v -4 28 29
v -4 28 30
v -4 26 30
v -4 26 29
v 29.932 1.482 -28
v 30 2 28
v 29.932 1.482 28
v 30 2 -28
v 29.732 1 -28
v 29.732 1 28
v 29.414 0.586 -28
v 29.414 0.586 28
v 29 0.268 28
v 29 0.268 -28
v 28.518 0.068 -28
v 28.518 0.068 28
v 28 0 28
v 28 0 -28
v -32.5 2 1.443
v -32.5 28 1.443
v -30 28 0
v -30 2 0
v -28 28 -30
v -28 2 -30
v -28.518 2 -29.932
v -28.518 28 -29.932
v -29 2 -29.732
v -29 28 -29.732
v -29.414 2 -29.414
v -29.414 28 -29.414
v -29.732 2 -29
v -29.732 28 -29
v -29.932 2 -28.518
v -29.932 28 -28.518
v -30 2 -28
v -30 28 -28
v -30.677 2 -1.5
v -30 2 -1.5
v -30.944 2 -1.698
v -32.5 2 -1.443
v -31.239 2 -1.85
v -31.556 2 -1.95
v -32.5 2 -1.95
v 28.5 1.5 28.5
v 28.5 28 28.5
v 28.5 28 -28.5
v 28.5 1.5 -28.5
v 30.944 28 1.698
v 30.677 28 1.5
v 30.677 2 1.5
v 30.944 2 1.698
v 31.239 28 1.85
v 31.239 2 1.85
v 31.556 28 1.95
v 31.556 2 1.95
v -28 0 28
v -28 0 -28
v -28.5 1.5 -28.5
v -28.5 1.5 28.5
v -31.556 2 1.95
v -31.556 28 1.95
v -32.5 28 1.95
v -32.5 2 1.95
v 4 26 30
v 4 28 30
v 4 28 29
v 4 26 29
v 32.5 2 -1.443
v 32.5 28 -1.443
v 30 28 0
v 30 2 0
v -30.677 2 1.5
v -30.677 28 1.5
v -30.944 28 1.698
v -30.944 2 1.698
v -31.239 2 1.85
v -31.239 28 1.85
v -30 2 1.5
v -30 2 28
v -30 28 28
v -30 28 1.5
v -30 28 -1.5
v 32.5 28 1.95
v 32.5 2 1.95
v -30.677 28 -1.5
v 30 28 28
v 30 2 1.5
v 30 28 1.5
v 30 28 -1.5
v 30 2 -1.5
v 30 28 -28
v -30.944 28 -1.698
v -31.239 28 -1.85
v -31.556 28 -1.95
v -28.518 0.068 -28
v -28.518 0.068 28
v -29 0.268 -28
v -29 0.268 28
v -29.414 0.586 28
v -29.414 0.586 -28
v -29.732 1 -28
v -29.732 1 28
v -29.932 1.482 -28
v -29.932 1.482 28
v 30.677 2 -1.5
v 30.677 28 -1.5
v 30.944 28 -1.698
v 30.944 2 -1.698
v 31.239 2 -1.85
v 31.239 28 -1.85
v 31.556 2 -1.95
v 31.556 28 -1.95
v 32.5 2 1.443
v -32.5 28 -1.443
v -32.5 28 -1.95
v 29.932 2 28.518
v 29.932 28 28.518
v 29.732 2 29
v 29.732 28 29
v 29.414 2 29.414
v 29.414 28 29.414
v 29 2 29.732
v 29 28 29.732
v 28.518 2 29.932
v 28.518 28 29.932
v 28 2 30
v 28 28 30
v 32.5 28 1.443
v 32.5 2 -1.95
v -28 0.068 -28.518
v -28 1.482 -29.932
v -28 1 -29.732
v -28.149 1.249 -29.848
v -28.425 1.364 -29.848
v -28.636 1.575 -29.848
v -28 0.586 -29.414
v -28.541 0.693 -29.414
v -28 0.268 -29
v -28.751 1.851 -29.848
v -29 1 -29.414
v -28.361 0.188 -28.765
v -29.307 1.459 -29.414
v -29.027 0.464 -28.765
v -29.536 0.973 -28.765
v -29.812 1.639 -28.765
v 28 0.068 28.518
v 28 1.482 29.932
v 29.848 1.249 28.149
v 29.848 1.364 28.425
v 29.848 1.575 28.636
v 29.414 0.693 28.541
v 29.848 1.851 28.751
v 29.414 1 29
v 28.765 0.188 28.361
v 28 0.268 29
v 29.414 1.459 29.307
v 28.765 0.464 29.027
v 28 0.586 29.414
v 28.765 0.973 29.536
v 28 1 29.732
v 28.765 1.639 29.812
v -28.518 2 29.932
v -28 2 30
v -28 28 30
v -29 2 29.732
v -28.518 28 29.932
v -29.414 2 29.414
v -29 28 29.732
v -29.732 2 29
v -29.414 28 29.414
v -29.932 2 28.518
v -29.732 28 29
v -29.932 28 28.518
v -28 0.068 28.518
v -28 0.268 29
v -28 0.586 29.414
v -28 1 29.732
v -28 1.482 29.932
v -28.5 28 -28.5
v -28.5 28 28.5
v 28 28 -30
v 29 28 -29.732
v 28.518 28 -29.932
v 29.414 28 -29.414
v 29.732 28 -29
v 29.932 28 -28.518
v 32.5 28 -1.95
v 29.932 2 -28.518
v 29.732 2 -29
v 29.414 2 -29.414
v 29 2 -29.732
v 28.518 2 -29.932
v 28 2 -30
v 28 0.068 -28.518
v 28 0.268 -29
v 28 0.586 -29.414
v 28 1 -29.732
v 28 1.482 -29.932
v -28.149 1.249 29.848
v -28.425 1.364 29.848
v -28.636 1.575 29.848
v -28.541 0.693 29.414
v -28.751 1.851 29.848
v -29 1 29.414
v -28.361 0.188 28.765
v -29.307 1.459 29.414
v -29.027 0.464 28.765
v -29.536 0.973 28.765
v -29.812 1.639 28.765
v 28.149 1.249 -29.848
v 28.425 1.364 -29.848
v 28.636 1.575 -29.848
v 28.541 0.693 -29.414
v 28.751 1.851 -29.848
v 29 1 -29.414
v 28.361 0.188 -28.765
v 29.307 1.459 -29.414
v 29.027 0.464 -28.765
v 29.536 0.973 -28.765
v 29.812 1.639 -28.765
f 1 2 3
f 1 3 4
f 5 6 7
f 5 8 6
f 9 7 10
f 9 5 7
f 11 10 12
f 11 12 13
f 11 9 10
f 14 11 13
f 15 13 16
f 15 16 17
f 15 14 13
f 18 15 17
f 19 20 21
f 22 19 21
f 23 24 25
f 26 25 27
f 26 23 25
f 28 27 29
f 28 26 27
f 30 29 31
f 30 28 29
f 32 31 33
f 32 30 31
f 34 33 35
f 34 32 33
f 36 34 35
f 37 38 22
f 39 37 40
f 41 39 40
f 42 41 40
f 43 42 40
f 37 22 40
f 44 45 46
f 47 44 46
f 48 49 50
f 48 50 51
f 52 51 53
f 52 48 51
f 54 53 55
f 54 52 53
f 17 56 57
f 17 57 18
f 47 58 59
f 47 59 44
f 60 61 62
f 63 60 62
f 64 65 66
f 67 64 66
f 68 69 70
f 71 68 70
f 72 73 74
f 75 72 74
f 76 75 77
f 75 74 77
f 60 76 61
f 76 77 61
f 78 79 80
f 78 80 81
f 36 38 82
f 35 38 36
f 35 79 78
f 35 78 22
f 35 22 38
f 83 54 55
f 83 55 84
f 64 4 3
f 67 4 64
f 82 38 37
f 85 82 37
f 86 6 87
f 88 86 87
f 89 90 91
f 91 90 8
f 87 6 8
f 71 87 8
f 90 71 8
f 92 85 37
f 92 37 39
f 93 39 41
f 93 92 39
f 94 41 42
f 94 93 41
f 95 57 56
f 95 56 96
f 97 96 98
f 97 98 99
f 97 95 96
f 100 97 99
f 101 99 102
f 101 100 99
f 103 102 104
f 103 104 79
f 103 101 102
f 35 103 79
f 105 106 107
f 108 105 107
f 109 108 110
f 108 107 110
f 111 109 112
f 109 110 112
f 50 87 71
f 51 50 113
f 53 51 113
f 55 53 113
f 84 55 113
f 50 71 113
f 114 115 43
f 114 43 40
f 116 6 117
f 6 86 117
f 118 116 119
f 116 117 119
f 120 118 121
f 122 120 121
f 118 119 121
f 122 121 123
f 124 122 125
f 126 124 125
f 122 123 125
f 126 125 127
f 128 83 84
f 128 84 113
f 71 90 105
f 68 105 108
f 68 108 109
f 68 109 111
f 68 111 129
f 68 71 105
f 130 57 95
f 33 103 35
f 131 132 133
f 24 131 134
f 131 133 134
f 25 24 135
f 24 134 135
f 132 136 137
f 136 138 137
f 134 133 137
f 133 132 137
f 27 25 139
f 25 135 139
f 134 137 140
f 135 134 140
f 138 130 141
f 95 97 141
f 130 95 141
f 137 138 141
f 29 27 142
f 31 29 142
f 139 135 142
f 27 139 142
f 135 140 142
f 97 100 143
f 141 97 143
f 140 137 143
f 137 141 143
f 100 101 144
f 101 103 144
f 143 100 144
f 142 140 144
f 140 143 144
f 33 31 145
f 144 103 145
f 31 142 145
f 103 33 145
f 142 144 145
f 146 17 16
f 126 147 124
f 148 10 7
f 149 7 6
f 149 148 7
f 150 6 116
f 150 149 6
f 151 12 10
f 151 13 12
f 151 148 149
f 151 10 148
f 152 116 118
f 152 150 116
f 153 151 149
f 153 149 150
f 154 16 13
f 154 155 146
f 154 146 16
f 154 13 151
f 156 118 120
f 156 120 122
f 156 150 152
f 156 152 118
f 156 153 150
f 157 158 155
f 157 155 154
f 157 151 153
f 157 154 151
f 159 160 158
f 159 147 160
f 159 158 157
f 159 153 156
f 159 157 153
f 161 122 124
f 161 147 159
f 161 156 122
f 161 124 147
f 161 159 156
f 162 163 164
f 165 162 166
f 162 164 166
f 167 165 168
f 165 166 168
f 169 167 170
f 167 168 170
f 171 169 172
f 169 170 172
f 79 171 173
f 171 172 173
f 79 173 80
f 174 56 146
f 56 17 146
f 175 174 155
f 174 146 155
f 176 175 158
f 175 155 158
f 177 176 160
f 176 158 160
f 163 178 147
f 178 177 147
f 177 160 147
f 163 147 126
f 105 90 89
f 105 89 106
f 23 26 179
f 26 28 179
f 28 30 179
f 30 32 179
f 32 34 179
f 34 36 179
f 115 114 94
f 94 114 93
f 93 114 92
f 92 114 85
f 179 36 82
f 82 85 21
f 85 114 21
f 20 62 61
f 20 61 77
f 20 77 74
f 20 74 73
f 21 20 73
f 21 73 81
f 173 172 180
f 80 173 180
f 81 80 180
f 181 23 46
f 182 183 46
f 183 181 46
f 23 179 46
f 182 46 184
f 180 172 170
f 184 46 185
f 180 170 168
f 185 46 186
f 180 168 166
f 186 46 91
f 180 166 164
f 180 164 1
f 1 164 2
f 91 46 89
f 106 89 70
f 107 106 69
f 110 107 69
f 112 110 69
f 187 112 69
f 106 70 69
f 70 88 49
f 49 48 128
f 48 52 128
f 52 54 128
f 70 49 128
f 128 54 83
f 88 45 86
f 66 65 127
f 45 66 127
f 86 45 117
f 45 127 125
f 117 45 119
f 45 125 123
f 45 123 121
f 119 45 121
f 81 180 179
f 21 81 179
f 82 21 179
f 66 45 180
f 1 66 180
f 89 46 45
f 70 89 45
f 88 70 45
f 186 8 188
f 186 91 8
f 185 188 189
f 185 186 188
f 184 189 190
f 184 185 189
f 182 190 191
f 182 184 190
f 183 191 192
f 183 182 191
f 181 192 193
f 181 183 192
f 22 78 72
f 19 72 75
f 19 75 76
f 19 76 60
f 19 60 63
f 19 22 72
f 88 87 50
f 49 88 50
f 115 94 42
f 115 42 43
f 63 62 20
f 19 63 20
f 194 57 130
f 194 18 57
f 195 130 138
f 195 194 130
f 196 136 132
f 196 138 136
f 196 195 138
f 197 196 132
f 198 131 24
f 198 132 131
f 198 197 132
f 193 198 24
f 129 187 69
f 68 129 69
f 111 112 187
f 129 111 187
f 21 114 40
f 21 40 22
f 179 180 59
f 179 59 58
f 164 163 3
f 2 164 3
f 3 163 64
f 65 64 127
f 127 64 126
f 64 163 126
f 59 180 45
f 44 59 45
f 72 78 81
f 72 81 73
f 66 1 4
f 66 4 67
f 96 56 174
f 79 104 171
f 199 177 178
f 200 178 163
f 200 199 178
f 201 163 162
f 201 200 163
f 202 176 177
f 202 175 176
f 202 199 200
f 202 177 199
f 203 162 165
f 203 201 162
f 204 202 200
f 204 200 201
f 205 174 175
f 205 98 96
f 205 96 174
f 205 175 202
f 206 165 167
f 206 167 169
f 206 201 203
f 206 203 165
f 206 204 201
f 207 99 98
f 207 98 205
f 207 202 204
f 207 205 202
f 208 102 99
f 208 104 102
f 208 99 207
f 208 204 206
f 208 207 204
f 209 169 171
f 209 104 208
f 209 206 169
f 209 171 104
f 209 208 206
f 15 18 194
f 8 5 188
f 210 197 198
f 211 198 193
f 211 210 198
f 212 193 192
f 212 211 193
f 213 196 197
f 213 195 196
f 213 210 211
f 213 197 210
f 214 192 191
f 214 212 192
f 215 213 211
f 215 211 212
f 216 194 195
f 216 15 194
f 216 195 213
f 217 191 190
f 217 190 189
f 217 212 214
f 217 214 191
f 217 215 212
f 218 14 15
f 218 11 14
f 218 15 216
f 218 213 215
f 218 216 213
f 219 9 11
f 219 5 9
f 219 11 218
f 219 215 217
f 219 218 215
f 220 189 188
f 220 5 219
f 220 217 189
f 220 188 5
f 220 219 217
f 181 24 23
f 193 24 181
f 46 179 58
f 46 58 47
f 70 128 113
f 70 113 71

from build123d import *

# Parameters (mm, degrees)
SKETCH_1_W            = 60
SKETCH_1_H            = 60
EXTRUDE_1_DEPTH       = 28
SKETCH_2_W            = 57
SKETCH_2_H            = 57
CUT_EXTRUDE_1_DEPTH   = 26.5
EXTRUDE_3_DEPTH       = 26
MIRROR_5_COPY_1_DEPTH = 26
SKETCH_4_W            = 8
SKETCH_4_H            = 2
CUT_EXTRUDE_2_DEPTH   = 2
FILLET_1_R            = 2


with BuildPart() as part:
    # 草图1 → 凸台-拉伸1 (new body)
    with BuildSketch(Plane(origin=(0, 0, 0), x_dir=(1, 0, 0), z_dir=(0, 1, 0))):
        Rectangle(SKETCH_1_W, SKETCH_1_H)
    extrude(amount=EXTRUDE_1_DEPTH)

    # 草图2 → 切除-拉伸1 (cut)
    with BuildSketch(Plane(origin=(0, 28, 0), x_dir=(1, 0, 0), z_dir=(0, 1, 0))):
        Rectangle(SKETCH_2_W, SKETCH_2_H)
    extrude(amount=-CUT_EXTRUDE_1_DEPTH, mode=Mode.SUBTRACT)

    # 草图3 → 凸台-拉伸3 (add)
    with BuildSketch(Plane(origin=(0, 28, 0), x_dir=(1, 0, 0), z_dir=(0, 1, 0))):
        with BuildLine():
            Line((-30, 0), (-30, -1.5))
            Line((-30, -1.5), (-30.677124344, -1.5))
            ThreePointArc((-30.677124344, -1.5), (-31.088161527, -1.780042303), (-31.555590279, -1.95))
            Line((-31.555590279, -1.95), (-32.5, -1.95))
            Line((-32.5, -1.95), (-32.5, -1.443375673))
            Line((-32.5, -1.443375673), (-30, 0))
        make_face()
    extrude_3 = extrude(amount=-EXTRUDE_3_DEPTH)

    # 镜向4: 凸台-拉伸3 across plane
    add(extrude_3.mirror(Plane.XY))

    # 镜向5: 凸台-拉伸3 across plane
    add(extrude_3.mirror(Plane(origin=(0, 0, 0), x_dir=(0, 0, 1), z_dir=(1, 0, 0))))

    # 镜向5 copy 1 sketch → 镜向5 copy 1 (add)
    with BuildSketch(Plane(origin=(0, 28, 0), x_dir=(-1, 0, 0), z_dir=(0, 1, 0))):
        with BuildLine():
            Line((-30, 0), (-30, -1.5))
            Line((-30, -1.5), (-30.677124344, -1.5))
            ThreePointArc((-30.677124344, -1.5), (-31.088161527, -1.780042303), (-31.555590279, -1.95))
            Line((-31.555590279, -1.95), (-32.5, -1.95))
            Line((-32.5, -1.95), (-32.5, -1.443375673))
            Line((-32.5, -1.443375673), (-30, 0))
        make_face()
    extrude(amount=-MIRROR_5_COPY_1_DEPTH)

    # 草图4 → 切除-拉伸2 (cut)
    with BuildSketch(Plane(origin=(0, 28, 0), x_dir=(1, 0, 0), z_dir=(0, 1, 0))):
        with Locations((0, -30)):
            Rectangle(SKETCH_4_W, SKETCH_4_H)
    extrude(amount=-CUT_EXTRUDE_2_DEPTH, mode=Mode.SUBTRACT)

    # 圆角1
    fillet_1_edges = [part.edges().sort_by_distance(p)[0] for p in [
        (-30, 0, 0),
        (0, 0, 30),
        (30, 0, 0),
        (0, 0, -30),
        (30, 14, 30),
        (-30, 14, 30),
        (30, 14, -30),
        (-30, 14, -30),
    ]]
    fillet(fillet_1_edges, radius=FILLET_1_R - 0.0001)  # a hair under: the kernel refuses the full size


solid = part.part
